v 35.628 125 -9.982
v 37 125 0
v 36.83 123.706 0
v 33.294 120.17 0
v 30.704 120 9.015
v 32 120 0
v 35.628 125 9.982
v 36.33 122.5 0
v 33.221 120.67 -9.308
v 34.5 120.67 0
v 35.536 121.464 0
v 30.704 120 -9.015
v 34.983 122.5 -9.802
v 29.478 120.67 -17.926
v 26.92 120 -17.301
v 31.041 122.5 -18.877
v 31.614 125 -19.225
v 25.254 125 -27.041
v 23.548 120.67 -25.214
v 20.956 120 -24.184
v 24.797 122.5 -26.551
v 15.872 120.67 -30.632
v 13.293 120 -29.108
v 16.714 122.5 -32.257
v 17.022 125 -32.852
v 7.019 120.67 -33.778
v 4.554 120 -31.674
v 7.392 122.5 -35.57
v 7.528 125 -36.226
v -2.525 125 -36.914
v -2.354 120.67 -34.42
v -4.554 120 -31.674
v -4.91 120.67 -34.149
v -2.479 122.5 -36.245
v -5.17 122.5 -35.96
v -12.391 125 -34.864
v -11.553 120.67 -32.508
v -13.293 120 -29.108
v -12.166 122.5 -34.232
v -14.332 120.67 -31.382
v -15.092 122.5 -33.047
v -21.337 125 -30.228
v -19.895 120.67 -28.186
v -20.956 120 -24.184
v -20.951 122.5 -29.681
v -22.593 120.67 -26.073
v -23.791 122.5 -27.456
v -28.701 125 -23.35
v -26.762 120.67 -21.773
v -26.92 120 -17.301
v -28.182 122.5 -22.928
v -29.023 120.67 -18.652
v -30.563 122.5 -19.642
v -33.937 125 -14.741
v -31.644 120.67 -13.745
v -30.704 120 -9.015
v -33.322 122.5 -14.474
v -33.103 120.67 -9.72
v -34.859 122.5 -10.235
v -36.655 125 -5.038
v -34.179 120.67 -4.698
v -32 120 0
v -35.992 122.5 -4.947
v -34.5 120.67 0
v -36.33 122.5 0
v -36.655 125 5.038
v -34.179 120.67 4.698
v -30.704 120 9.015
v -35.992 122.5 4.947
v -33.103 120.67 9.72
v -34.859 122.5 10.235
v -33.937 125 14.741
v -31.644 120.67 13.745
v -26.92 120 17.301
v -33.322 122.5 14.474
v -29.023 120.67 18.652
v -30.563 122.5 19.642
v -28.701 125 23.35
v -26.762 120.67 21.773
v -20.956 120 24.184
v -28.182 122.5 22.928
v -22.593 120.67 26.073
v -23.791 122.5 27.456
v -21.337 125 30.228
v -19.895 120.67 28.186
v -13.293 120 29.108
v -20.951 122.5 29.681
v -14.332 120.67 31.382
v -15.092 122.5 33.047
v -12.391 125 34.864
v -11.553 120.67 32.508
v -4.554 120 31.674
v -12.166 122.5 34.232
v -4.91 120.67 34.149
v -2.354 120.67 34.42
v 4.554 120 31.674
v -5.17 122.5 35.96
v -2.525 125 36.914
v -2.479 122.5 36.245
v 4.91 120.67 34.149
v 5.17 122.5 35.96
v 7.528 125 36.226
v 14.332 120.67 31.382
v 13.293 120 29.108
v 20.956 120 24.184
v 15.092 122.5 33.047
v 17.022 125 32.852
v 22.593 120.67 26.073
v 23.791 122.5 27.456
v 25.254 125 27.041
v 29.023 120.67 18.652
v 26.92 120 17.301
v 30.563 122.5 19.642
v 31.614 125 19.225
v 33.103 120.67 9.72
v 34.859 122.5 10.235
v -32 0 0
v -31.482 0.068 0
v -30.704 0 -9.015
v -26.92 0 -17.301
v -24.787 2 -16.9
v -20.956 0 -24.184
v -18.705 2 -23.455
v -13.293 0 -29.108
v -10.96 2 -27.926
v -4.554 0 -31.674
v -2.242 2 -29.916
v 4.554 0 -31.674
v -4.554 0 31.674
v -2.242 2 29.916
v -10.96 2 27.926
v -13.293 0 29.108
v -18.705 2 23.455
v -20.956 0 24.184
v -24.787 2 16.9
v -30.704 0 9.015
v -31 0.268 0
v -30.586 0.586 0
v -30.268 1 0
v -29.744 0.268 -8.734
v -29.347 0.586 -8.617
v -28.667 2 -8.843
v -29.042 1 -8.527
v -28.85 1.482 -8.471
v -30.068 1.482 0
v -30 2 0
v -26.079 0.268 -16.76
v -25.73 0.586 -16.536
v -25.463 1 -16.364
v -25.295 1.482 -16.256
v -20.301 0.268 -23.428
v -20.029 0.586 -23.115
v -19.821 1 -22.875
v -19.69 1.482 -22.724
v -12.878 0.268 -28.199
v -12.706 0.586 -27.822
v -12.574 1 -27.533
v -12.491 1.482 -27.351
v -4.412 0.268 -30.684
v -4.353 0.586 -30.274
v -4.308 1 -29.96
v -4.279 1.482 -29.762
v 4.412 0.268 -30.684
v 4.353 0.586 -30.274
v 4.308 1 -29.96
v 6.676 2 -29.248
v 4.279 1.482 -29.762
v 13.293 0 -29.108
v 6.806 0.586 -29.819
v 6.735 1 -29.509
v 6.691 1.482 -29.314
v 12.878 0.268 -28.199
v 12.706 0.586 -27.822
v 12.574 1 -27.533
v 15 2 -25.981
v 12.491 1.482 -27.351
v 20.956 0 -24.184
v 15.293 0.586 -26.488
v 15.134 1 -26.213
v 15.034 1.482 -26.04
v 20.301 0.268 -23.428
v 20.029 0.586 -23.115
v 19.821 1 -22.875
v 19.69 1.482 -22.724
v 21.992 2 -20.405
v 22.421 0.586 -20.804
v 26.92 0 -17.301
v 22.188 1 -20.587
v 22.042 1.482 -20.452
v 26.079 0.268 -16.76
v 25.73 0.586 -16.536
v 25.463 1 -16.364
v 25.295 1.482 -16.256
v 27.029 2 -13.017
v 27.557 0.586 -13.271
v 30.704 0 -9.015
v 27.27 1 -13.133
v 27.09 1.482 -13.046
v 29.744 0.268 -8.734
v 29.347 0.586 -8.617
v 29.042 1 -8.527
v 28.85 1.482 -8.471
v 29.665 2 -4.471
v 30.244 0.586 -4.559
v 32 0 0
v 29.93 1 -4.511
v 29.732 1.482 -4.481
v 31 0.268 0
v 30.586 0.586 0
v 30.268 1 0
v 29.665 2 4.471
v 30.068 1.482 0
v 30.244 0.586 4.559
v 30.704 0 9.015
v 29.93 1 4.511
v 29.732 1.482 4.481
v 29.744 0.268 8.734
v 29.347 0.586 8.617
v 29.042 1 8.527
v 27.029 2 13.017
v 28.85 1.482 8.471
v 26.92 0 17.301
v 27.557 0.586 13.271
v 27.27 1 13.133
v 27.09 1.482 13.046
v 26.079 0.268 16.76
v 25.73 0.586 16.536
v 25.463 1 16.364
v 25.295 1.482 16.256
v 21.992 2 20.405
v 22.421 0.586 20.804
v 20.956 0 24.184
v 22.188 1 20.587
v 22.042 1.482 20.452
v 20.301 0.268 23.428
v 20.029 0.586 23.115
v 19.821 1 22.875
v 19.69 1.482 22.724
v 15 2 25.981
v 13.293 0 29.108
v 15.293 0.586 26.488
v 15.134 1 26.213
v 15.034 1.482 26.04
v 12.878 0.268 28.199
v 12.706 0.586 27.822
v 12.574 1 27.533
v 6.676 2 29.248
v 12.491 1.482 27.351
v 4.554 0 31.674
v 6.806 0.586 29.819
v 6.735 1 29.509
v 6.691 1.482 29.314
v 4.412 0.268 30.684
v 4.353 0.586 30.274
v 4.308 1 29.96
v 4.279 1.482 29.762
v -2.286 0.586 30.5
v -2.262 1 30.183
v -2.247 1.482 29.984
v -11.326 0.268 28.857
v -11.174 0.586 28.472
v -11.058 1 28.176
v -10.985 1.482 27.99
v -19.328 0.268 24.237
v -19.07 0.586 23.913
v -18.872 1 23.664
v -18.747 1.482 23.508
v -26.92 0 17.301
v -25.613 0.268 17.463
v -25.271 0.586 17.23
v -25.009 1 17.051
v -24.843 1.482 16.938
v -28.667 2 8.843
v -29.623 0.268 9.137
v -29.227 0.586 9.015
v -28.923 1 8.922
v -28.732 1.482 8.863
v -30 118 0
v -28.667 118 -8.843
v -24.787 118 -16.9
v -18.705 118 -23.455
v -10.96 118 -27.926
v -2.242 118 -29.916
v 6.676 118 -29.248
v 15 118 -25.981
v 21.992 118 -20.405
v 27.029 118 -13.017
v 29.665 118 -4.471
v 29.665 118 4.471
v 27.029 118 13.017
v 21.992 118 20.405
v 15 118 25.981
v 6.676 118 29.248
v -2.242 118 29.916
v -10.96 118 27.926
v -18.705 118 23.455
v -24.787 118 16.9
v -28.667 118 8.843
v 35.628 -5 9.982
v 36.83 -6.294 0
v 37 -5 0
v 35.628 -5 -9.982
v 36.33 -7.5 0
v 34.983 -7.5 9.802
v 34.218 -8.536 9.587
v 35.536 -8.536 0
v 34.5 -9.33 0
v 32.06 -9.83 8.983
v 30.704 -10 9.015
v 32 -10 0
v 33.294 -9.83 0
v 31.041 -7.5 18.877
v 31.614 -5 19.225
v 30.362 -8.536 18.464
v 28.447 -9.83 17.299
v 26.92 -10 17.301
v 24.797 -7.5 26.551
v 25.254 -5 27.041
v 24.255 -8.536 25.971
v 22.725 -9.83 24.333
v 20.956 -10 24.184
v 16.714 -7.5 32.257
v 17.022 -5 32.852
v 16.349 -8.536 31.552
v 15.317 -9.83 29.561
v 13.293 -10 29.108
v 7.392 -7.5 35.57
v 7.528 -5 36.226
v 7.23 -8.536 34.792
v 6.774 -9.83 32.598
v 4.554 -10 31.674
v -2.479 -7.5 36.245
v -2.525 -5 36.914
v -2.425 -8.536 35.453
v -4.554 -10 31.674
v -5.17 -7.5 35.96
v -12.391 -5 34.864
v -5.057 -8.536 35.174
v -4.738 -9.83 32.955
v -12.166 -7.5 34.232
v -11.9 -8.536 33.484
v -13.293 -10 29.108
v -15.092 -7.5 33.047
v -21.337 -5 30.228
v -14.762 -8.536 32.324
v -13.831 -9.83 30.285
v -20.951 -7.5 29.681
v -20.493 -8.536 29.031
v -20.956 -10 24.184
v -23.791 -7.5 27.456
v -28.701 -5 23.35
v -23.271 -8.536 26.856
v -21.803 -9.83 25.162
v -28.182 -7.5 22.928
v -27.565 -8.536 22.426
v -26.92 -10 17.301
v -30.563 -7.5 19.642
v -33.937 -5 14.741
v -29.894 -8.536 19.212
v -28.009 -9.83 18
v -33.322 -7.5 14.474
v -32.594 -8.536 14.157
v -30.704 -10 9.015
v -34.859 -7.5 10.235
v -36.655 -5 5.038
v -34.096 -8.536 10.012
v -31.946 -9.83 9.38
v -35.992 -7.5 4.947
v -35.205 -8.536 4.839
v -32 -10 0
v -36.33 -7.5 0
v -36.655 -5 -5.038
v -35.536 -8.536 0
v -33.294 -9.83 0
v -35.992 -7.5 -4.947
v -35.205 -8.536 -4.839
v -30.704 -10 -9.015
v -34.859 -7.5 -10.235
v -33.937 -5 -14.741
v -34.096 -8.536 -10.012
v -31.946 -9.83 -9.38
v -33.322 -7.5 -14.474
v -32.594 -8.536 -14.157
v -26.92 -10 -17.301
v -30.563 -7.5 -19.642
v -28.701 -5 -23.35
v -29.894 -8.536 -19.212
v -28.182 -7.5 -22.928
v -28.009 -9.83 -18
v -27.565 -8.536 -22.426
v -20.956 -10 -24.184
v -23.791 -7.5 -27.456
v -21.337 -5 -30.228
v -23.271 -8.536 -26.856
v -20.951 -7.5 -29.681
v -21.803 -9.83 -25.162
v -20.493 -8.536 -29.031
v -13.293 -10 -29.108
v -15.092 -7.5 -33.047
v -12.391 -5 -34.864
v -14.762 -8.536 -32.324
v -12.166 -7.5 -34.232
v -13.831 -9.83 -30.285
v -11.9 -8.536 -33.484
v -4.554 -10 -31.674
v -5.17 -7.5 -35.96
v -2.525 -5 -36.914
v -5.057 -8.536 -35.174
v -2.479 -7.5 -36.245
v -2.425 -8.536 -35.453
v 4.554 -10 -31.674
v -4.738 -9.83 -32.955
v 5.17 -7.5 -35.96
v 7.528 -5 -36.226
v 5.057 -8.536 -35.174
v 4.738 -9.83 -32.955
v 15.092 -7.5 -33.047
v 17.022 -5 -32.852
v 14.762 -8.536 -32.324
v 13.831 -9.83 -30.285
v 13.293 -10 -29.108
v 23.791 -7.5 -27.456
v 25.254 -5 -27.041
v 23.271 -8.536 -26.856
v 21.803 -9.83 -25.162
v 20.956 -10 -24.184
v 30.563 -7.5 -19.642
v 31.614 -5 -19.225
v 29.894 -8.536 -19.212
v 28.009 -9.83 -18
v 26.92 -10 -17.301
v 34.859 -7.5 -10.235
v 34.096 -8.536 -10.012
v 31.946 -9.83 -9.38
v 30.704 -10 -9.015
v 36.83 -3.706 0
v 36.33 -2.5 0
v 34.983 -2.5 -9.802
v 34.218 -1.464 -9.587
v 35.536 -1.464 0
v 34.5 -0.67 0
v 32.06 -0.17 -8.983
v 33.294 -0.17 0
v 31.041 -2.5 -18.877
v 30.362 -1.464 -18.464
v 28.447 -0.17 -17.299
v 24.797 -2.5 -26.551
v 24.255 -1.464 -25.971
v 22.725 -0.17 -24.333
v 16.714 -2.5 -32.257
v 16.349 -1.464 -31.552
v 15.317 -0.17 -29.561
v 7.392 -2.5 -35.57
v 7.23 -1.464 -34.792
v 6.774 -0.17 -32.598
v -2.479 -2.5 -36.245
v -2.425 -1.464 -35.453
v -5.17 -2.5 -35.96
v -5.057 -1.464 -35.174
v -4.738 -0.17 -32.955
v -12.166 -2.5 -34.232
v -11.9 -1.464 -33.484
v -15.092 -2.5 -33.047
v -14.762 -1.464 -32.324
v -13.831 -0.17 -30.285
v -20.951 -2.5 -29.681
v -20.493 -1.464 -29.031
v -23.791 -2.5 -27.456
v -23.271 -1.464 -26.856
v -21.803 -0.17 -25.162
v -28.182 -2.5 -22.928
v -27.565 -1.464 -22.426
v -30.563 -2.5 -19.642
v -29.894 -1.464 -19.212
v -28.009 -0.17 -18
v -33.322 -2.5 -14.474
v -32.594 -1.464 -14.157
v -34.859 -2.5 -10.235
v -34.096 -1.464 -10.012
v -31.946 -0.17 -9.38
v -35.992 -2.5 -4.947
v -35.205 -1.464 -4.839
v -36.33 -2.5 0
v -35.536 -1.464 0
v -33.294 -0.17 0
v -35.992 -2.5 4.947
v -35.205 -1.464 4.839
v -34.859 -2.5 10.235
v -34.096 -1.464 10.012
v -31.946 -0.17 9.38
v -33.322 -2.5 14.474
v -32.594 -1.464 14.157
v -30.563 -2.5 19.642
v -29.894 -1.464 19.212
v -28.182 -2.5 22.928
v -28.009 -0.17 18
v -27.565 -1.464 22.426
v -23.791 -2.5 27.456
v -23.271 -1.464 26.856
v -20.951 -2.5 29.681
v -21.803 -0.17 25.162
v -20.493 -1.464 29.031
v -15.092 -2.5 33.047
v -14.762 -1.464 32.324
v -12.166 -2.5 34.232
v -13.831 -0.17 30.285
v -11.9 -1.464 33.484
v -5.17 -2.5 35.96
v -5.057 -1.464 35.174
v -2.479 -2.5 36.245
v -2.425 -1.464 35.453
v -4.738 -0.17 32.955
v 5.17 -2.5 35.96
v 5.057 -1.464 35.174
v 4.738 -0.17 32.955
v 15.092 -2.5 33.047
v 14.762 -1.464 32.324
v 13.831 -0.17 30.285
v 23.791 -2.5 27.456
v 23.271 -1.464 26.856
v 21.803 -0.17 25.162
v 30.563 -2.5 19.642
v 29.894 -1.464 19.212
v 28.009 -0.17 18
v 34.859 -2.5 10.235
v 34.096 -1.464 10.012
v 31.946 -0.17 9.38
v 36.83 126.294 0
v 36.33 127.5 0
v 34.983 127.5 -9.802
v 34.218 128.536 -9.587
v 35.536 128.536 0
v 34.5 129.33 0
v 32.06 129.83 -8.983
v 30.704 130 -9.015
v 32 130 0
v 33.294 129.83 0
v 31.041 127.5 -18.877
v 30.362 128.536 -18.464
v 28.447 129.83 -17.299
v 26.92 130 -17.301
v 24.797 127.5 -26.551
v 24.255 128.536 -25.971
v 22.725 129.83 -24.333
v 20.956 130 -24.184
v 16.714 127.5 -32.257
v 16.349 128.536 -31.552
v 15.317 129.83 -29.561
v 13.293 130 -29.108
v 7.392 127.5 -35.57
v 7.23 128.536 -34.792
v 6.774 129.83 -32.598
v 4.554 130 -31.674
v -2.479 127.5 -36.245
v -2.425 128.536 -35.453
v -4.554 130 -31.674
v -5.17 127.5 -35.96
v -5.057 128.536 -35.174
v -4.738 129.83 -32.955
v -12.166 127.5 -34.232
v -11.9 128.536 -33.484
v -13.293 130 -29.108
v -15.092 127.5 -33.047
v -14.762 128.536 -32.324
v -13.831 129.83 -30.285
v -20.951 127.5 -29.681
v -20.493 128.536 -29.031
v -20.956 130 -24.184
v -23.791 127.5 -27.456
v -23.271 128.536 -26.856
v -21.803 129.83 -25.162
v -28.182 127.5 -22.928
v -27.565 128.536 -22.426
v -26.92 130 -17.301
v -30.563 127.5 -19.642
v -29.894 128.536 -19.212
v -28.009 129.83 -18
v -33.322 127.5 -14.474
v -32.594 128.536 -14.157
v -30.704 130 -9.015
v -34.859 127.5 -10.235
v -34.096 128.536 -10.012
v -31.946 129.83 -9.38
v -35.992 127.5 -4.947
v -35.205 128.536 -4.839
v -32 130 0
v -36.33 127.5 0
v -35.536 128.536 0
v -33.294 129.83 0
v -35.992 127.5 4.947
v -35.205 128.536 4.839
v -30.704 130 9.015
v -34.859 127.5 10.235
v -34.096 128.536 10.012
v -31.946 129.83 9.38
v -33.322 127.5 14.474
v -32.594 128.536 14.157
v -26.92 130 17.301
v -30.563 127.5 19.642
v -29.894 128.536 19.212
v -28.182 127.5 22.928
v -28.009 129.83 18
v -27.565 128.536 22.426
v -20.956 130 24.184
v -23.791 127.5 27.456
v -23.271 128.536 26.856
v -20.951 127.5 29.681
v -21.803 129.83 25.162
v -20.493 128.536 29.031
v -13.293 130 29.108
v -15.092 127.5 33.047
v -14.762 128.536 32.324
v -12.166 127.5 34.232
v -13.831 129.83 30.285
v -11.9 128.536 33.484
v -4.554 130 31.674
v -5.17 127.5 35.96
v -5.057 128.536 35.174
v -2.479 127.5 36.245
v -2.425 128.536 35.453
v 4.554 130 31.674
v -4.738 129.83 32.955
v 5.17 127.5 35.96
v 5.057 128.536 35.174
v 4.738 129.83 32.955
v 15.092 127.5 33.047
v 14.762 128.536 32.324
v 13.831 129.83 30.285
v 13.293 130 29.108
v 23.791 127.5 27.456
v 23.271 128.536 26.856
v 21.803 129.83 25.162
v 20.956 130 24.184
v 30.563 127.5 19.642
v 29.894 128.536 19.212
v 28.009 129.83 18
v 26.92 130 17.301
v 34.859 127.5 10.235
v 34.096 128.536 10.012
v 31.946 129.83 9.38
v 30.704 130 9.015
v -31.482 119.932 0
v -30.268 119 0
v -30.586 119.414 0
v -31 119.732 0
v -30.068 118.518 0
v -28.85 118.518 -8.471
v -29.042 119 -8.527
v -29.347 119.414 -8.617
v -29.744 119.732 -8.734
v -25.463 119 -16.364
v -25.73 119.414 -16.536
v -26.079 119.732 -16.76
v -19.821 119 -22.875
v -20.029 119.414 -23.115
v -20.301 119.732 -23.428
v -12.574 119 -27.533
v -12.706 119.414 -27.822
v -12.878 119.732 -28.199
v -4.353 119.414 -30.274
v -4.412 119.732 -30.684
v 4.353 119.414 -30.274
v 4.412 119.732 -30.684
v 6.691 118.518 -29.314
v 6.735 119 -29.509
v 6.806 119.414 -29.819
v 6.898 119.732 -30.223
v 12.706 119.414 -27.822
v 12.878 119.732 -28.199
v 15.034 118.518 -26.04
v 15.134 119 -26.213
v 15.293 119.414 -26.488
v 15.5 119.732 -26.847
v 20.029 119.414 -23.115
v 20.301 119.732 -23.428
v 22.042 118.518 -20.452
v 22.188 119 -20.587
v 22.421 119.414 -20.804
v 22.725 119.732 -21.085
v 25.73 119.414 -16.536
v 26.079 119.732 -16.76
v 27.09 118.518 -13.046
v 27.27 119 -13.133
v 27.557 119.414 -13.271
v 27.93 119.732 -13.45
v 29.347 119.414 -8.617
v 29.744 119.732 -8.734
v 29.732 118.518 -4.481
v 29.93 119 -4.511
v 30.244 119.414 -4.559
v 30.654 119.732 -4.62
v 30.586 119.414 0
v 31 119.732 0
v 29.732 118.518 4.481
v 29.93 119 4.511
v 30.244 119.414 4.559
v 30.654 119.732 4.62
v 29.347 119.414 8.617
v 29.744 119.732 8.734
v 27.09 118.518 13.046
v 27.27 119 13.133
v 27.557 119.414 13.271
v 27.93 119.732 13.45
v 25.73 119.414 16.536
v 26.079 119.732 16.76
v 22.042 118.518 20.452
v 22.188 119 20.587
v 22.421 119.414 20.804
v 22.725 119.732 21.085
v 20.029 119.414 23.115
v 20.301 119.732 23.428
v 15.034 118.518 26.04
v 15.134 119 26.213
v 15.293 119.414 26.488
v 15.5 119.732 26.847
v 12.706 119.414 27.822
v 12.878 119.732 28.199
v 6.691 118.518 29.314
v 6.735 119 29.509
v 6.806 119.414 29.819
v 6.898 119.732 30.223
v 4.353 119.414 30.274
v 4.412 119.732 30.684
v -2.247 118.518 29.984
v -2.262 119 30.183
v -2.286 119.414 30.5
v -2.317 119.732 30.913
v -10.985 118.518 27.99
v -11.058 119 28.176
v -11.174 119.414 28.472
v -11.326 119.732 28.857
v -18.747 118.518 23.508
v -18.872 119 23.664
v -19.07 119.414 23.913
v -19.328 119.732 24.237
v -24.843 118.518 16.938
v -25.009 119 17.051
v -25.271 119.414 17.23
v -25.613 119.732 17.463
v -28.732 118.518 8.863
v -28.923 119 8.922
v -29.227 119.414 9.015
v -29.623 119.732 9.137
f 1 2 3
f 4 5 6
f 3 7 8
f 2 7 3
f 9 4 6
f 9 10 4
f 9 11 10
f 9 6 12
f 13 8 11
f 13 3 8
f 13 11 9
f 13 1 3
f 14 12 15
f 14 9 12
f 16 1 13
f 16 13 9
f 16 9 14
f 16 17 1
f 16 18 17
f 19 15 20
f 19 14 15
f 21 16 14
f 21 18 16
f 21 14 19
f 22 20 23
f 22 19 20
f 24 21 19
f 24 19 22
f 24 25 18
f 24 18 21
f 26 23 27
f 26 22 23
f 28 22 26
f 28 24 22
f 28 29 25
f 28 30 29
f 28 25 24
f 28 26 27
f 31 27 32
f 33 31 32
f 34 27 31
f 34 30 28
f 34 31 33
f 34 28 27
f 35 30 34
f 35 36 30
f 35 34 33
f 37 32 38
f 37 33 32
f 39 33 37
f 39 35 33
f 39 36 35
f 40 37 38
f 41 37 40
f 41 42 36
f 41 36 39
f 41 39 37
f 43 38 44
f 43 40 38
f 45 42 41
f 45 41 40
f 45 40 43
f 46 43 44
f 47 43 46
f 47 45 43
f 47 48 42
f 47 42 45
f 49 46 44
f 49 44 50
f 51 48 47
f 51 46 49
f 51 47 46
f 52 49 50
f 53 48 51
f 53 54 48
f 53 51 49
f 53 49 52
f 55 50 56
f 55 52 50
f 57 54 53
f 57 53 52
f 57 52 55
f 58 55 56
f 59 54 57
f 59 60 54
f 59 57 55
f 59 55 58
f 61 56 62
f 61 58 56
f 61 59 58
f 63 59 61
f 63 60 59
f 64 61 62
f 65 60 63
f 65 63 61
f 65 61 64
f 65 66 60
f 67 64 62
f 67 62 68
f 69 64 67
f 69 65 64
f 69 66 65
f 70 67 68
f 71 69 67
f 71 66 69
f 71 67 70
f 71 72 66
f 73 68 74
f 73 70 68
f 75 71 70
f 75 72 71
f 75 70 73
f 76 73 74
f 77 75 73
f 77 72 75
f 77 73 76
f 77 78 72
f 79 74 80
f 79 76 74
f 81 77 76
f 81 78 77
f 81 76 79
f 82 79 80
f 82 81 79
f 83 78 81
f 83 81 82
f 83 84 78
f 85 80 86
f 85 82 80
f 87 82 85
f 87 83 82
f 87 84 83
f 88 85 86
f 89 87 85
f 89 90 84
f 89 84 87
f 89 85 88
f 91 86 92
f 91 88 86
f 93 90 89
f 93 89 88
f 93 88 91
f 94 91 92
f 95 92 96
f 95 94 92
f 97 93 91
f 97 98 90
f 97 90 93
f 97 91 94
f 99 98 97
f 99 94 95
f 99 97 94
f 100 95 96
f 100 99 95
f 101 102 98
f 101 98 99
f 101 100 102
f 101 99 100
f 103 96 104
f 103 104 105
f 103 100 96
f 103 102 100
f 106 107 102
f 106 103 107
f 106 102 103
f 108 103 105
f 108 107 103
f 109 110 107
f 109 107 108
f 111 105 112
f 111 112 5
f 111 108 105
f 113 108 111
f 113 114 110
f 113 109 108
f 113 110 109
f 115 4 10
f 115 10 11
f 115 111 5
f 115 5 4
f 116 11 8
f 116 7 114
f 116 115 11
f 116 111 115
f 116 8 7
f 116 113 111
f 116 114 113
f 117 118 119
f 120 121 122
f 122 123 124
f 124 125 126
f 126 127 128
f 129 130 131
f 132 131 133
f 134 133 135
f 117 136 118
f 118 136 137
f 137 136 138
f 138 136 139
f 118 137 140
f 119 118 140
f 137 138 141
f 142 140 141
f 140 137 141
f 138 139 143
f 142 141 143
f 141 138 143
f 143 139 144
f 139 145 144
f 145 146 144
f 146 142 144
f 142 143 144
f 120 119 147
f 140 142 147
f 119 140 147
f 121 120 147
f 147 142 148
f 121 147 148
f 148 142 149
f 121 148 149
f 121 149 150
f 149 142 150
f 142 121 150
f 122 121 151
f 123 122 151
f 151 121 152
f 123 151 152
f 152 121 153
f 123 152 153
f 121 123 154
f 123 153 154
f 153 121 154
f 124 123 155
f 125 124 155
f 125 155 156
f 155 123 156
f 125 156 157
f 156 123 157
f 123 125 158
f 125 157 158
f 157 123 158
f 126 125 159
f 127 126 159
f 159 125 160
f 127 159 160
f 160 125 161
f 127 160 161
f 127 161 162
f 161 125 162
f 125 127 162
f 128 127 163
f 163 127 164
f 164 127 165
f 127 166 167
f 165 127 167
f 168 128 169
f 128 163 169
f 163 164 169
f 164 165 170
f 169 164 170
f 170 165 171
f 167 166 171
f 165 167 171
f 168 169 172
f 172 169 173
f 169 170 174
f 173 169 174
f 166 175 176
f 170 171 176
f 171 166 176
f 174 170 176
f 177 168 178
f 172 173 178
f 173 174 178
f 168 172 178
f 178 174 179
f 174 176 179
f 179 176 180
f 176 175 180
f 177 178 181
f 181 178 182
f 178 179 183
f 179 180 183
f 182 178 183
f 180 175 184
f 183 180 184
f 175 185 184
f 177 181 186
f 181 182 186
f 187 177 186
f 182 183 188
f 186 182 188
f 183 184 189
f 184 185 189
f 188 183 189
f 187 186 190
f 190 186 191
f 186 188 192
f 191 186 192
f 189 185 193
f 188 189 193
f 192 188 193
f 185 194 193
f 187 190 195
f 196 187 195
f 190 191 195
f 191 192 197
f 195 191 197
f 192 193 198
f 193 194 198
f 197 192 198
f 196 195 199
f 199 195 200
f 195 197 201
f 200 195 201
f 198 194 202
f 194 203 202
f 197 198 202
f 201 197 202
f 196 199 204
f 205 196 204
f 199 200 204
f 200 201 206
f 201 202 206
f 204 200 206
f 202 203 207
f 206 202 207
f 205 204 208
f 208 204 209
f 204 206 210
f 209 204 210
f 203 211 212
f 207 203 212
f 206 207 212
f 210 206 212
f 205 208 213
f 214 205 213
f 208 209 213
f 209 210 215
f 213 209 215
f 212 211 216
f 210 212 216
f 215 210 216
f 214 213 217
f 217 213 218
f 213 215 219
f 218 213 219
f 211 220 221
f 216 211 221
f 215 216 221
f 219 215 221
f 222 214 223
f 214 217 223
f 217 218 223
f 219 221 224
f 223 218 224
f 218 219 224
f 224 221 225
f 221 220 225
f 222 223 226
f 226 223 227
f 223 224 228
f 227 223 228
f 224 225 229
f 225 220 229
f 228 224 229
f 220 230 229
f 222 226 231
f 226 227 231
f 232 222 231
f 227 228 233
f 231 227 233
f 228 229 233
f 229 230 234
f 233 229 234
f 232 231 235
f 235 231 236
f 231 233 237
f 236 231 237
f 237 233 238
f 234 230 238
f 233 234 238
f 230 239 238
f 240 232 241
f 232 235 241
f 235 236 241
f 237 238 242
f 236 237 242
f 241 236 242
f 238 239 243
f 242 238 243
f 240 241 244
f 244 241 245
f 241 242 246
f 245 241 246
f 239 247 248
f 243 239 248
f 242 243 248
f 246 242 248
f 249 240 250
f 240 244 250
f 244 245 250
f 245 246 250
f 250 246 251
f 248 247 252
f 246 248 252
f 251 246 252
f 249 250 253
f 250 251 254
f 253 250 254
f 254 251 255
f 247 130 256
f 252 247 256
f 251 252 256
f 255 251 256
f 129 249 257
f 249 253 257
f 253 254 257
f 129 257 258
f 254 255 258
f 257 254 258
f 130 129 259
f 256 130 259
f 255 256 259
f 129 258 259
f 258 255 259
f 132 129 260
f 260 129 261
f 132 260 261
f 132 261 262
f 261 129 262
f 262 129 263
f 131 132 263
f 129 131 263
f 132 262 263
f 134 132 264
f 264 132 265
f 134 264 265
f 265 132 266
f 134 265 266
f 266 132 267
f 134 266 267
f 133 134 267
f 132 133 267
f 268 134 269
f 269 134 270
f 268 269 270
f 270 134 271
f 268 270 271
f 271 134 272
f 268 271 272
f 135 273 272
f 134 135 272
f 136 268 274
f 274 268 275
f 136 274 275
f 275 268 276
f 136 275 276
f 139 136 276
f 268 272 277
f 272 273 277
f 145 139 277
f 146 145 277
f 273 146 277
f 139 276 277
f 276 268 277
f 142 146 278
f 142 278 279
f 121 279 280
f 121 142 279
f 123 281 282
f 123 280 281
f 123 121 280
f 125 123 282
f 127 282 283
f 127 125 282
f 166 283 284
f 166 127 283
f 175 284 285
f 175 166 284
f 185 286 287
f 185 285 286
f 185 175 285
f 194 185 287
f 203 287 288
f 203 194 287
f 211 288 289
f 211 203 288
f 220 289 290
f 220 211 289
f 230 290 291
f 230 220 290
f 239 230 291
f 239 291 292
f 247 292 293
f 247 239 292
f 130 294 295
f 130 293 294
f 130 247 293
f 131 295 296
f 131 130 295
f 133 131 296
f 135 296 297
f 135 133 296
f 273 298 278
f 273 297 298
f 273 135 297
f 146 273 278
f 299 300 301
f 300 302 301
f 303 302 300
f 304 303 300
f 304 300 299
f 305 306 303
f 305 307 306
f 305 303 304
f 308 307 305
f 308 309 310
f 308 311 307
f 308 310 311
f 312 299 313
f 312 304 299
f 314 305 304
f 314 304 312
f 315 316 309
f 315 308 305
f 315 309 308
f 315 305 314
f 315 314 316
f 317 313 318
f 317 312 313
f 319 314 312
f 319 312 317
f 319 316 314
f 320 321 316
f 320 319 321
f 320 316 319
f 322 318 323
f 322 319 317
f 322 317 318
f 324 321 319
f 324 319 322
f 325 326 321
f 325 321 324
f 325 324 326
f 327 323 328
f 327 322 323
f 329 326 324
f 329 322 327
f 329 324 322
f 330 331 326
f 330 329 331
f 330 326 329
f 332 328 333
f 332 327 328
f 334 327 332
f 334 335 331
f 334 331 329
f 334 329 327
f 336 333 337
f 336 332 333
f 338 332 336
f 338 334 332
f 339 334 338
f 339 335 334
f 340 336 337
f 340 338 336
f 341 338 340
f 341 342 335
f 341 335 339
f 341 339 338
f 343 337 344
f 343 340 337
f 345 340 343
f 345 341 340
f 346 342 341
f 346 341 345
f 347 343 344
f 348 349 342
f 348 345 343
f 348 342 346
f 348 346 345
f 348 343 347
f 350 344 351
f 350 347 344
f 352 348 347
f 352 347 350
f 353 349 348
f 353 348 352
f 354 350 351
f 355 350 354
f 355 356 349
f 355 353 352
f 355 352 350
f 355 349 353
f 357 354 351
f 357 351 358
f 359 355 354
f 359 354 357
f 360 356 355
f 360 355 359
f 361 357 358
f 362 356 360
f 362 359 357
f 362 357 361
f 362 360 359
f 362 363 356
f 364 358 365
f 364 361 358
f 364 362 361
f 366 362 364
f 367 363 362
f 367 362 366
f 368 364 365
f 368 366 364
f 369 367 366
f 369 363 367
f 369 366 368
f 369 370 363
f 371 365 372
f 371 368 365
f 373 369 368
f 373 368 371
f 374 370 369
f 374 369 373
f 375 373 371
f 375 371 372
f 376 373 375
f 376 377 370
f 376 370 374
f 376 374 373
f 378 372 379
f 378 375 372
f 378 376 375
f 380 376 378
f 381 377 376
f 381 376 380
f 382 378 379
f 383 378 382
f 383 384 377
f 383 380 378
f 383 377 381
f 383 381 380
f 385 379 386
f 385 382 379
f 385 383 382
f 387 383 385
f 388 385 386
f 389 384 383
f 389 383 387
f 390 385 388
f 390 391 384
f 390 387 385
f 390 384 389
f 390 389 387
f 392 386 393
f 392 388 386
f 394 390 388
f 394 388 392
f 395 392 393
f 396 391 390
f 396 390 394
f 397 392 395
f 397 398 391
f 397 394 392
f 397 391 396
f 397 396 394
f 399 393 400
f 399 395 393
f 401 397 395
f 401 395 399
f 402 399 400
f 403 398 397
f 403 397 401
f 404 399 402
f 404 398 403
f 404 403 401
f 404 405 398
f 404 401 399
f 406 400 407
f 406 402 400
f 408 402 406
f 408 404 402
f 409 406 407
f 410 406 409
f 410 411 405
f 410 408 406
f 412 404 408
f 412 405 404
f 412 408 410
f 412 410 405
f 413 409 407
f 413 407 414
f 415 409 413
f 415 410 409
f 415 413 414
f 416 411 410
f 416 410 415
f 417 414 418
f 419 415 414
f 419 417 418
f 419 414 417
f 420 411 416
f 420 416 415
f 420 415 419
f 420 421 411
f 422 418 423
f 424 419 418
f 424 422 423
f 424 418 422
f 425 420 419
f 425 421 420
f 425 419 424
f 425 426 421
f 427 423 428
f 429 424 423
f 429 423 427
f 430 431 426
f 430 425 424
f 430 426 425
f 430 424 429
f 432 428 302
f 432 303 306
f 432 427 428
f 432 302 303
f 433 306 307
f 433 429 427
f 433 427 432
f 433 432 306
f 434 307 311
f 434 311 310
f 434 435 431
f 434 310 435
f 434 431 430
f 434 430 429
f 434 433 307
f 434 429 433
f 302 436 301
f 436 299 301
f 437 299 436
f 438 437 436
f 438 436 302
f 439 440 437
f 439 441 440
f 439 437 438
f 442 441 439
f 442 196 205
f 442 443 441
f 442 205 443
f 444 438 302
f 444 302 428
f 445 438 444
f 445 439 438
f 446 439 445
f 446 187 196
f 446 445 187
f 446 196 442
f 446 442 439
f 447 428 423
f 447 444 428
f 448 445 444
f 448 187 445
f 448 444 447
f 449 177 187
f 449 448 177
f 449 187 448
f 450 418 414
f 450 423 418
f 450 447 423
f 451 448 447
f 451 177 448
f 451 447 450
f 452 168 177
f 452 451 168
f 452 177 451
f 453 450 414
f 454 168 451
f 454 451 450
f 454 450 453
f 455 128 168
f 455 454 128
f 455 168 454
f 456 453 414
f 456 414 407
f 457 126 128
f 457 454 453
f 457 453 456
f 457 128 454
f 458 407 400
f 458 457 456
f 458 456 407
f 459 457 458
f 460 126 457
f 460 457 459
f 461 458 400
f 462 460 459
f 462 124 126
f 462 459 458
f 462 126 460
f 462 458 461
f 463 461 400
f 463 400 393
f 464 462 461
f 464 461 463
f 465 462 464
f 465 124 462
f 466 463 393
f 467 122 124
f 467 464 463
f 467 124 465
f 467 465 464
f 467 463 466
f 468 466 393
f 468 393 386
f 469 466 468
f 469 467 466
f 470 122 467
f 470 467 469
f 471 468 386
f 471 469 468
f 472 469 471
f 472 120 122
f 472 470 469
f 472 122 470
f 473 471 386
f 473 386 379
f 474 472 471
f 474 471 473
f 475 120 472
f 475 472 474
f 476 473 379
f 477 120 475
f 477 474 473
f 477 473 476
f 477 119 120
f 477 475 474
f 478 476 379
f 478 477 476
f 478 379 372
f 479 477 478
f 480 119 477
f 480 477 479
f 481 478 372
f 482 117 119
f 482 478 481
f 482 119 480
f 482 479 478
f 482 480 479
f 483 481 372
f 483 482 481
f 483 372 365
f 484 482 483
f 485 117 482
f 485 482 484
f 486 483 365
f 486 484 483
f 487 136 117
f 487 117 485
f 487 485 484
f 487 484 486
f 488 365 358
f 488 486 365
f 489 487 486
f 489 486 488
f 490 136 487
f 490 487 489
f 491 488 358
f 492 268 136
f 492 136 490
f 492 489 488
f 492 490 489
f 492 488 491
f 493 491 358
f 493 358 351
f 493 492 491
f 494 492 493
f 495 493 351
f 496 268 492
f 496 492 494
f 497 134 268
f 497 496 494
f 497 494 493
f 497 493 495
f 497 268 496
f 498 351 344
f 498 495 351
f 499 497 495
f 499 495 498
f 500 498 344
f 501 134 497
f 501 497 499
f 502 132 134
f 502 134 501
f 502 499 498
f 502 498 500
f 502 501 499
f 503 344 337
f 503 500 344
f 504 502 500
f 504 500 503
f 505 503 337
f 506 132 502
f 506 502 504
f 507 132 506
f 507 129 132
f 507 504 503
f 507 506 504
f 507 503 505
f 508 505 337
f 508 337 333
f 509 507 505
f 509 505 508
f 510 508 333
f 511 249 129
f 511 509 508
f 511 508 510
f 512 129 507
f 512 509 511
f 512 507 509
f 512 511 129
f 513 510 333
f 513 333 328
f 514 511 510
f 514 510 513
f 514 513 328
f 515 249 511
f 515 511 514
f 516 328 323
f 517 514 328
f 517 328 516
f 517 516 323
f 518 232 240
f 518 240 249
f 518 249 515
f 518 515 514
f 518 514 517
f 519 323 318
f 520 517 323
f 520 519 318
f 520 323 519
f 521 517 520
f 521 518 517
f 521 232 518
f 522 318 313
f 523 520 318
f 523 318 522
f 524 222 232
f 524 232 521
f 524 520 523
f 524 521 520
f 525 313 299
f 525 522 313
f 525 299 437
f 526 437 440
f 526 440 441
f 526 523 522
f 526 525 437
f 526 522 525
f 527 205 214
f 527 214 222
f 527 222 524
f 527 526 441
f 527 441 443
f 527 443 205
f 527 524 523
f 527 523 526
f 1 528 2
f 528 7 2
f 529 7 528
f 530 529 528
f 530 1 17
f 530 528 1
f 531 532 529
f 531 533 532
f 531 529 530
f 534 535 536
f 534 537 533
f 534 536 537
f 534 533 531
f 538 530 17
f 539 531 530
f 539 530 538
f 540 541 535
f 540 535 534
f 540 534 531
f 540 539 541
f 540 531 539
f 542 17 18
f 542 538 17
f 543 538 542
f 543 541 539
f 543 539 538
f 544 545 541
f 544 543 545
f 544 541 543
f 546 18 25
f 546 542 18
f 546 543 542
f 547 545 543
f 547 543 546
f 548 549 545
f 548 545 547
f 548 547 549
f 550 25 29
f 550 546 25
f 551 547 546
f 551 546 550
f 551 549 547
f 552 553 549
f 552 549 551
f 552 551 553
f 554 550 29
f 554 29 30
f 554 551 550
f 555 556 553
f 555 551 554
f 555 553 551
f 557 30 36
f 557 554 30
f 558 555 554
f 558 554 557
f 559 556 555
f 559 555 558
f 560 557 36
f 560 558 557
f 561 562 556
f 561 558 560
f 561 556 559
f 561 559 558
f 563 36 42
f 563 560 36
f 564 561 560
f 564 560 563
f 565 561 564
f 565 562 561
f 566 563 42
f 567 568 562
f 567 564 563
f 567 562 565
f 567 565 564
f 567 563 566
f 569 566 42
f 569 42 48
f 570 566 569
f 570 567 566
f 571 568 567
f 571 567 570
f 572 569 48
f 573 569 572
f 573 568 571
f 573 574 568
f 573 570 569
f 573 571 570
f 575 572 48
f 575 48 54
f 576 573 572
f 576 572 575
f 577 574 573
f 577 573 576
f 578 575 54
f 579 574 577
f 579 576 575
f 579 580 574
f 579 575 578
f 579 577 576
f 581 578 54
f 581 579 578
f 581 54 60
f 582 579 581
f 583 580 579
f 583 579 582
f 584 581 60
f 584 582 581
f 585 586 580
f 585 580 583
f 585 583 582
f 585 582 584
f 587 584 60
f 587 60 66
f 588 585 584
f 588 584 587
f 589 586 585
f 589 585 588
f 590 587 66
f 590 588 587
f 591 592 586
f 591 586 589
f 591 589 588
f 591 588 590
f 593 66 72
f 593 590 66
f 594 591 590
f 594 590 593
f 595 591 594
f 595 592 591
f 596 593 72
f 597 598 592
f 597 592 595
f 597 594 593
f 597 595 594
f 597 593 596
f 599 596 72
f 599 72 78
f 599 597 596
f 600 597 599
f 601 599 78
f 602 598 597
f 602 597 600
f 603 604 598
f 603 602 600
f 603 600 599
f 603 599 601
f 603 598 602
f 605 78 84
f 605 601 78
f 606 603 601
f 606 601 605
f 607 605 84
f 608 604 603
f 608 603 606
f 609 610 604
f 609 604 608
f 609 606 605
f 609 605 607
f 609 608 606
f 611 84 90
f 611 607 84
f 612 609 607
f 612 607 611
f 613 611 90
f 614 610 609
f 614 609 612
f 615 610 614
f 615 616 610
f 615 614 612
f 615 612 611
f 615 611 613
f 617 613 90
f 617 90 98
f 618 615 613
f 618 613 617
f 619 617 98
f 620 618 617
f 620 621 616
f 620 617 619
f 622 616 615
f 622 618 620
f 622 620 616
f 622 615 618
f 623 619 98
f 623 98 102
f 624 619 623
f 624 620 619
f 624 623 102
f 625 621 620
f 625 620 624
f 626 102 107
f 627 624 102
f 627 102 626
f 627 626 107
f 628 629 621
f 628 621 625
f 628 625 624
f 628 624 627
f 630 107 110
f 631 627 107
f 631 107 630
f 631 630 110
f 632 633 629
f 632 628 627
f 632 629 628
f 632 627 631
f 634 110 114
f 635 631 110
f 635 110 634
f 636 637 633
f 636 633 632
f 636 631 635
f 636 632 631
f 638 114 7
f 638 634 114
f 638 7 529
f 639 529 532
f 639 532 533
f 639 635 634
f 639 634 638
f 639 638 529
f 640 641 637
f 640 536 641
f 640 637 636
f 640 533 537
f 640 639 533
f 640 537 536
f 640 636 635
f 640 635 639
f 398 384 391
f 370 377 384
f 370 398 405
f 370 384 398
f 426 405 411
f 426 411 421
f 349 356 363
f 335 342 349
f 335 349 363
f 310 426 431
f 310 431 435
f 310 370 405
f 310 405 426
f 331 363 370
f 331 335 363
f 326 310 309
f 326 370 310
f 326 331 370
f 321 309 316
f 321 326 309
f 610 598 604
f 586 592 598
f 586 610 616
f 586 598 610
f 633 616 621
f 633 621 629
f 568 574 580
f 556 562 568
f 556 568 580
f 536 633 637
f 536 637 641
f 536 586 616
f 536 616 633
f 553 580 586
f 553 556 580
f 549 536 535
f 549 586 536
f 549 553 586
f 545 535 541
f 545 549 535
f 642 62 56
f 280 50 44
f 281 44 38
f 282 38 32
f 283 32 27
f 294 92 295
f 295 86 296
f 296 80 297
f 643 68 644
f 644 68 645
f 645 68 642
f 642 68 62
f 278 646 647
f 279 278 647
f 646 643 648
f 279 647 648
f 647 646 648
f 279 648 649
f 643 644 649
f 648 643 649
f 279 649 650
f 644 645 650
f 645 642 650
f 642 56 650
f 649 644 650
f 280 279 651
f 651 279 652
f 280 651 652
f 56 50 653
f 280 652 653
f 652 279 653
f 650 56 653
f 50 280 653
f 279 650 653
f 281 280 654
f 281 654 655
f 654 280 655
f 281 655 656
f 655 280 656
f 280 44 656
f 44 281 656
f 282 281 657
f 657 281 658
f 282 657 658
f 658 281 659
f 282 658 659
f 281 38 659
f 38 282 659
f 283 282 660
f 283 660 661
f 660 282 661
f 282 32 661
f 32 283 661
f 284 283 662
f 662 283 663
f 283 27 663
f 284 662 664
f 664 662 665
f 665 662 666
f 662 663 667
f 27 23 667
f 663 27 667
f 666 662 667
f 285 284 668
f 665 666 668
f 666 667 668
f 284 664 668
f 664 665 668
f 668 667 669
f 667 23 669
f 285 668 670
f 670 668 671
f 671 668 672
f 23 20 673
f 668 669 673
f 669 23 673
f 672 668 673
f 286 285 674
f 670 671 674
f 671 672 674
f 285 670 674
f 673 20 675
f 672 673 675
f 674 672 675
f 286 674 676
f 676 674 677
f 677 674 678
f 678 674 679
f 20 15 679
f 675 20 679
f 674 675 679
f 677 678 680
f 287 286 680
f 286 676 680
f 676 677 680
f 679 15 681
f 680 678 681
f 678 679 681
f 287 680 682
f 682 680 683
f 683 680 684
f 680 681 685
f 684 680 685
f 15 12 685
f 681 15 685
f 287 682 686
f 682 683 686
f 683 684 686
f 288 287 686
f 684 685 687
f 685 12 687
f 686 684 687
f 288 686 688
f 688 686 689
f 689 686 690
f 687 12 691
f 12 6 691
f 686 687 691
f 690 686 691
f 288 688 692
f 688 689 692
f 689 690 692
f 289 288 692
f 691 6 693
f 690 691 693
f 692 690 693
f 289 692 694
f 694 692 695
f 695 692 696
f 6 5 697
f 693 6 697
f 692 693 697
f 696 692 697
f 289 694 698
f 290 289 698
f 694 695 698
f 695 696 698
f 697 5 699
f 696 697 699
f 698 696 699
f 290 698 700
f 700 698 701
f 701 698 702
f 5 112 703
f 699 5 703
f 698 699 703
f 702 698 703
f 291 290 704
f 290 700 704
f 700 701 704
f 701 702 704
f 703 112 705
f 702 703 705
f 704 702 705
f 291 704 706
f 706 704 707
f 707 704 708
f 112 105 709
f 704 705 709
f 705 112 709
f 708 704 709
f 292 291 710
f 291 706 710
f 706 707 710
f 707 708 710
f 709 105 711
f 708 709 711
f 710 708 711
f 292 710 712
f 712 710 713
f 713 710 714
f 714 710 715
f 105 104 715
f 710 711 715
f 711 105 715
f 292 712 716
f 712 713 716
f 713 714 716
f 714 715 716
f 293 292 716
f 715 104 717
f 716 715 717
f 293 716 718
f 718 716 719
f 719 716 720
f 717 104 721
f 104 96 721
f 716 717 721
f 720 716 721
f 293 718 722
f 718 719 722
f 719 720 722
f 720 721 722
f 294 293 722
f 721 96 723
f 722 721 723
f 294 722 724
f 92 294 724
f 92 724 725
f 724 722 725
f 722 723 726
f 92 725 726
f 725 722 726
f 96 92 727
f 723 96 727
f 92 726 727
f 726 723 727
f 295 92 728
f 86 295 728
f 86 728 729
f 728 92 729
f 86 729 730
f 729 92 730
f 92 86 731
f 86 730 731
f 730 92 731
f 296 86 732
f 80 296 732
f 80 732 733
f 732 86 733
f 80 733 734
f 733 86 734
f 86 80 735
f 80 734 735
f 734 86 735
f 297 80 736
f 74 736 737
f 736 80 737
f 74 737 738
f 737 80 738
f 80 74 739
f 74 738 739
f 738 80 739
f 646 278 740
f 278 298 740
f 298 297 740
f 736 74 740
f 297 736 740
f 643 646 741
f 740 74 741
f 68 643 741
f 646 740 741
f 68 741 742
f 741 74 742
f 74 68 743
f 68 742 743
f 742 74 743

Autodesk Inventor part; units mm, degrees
ref_plane "YZ Plane" through (0, 0, 0) normal (1, 0, 0) x (0, 1, 0)
ref_plane "XZ Plane" through (0, 0, 0) normal (0, 1, 0) x (-1, 0, 0)
ref_plane "XY Plane" through (0, 0, 0) normal (0, 0, 1) x (1, 0, 0)
sketch "草图1" plane through (0, 0, 0) normal (0, 1, 0) x (-1, 0, 0)
  circle A0 centre (0, 0) radius 30
  dimension "d0" = 60
extrude "拉伸1" add sketch "草图1" along normal blind 120
sketch "草图2" plane through (0, 120, 0) normal (0, 1, 0) x (1, 0, 0)
  circle A0 centre (0, 0) radius 37
extrude "拉伸2" add sketch "草图2" along normal blind 10
sketch "草图3" plane through (0, 0, 0) normal (0, -1, 0) x (1, 0, 0)
  circle A0 centre (0, 0) radius 37
extrude "拉伸3" add sketch "草图3" along normal blind 10
fillet "圆角1" radius 5 4 edges at (-37, 130, 0) (-37, 120, 0) (-37, 0, 0) (-37, -10, 0)
fillet "圆角2" radius 2 2 edges at (30, 120, 0) (30, 0, 0)
properties part number "销钉" material "钢，高强度，低合金"
